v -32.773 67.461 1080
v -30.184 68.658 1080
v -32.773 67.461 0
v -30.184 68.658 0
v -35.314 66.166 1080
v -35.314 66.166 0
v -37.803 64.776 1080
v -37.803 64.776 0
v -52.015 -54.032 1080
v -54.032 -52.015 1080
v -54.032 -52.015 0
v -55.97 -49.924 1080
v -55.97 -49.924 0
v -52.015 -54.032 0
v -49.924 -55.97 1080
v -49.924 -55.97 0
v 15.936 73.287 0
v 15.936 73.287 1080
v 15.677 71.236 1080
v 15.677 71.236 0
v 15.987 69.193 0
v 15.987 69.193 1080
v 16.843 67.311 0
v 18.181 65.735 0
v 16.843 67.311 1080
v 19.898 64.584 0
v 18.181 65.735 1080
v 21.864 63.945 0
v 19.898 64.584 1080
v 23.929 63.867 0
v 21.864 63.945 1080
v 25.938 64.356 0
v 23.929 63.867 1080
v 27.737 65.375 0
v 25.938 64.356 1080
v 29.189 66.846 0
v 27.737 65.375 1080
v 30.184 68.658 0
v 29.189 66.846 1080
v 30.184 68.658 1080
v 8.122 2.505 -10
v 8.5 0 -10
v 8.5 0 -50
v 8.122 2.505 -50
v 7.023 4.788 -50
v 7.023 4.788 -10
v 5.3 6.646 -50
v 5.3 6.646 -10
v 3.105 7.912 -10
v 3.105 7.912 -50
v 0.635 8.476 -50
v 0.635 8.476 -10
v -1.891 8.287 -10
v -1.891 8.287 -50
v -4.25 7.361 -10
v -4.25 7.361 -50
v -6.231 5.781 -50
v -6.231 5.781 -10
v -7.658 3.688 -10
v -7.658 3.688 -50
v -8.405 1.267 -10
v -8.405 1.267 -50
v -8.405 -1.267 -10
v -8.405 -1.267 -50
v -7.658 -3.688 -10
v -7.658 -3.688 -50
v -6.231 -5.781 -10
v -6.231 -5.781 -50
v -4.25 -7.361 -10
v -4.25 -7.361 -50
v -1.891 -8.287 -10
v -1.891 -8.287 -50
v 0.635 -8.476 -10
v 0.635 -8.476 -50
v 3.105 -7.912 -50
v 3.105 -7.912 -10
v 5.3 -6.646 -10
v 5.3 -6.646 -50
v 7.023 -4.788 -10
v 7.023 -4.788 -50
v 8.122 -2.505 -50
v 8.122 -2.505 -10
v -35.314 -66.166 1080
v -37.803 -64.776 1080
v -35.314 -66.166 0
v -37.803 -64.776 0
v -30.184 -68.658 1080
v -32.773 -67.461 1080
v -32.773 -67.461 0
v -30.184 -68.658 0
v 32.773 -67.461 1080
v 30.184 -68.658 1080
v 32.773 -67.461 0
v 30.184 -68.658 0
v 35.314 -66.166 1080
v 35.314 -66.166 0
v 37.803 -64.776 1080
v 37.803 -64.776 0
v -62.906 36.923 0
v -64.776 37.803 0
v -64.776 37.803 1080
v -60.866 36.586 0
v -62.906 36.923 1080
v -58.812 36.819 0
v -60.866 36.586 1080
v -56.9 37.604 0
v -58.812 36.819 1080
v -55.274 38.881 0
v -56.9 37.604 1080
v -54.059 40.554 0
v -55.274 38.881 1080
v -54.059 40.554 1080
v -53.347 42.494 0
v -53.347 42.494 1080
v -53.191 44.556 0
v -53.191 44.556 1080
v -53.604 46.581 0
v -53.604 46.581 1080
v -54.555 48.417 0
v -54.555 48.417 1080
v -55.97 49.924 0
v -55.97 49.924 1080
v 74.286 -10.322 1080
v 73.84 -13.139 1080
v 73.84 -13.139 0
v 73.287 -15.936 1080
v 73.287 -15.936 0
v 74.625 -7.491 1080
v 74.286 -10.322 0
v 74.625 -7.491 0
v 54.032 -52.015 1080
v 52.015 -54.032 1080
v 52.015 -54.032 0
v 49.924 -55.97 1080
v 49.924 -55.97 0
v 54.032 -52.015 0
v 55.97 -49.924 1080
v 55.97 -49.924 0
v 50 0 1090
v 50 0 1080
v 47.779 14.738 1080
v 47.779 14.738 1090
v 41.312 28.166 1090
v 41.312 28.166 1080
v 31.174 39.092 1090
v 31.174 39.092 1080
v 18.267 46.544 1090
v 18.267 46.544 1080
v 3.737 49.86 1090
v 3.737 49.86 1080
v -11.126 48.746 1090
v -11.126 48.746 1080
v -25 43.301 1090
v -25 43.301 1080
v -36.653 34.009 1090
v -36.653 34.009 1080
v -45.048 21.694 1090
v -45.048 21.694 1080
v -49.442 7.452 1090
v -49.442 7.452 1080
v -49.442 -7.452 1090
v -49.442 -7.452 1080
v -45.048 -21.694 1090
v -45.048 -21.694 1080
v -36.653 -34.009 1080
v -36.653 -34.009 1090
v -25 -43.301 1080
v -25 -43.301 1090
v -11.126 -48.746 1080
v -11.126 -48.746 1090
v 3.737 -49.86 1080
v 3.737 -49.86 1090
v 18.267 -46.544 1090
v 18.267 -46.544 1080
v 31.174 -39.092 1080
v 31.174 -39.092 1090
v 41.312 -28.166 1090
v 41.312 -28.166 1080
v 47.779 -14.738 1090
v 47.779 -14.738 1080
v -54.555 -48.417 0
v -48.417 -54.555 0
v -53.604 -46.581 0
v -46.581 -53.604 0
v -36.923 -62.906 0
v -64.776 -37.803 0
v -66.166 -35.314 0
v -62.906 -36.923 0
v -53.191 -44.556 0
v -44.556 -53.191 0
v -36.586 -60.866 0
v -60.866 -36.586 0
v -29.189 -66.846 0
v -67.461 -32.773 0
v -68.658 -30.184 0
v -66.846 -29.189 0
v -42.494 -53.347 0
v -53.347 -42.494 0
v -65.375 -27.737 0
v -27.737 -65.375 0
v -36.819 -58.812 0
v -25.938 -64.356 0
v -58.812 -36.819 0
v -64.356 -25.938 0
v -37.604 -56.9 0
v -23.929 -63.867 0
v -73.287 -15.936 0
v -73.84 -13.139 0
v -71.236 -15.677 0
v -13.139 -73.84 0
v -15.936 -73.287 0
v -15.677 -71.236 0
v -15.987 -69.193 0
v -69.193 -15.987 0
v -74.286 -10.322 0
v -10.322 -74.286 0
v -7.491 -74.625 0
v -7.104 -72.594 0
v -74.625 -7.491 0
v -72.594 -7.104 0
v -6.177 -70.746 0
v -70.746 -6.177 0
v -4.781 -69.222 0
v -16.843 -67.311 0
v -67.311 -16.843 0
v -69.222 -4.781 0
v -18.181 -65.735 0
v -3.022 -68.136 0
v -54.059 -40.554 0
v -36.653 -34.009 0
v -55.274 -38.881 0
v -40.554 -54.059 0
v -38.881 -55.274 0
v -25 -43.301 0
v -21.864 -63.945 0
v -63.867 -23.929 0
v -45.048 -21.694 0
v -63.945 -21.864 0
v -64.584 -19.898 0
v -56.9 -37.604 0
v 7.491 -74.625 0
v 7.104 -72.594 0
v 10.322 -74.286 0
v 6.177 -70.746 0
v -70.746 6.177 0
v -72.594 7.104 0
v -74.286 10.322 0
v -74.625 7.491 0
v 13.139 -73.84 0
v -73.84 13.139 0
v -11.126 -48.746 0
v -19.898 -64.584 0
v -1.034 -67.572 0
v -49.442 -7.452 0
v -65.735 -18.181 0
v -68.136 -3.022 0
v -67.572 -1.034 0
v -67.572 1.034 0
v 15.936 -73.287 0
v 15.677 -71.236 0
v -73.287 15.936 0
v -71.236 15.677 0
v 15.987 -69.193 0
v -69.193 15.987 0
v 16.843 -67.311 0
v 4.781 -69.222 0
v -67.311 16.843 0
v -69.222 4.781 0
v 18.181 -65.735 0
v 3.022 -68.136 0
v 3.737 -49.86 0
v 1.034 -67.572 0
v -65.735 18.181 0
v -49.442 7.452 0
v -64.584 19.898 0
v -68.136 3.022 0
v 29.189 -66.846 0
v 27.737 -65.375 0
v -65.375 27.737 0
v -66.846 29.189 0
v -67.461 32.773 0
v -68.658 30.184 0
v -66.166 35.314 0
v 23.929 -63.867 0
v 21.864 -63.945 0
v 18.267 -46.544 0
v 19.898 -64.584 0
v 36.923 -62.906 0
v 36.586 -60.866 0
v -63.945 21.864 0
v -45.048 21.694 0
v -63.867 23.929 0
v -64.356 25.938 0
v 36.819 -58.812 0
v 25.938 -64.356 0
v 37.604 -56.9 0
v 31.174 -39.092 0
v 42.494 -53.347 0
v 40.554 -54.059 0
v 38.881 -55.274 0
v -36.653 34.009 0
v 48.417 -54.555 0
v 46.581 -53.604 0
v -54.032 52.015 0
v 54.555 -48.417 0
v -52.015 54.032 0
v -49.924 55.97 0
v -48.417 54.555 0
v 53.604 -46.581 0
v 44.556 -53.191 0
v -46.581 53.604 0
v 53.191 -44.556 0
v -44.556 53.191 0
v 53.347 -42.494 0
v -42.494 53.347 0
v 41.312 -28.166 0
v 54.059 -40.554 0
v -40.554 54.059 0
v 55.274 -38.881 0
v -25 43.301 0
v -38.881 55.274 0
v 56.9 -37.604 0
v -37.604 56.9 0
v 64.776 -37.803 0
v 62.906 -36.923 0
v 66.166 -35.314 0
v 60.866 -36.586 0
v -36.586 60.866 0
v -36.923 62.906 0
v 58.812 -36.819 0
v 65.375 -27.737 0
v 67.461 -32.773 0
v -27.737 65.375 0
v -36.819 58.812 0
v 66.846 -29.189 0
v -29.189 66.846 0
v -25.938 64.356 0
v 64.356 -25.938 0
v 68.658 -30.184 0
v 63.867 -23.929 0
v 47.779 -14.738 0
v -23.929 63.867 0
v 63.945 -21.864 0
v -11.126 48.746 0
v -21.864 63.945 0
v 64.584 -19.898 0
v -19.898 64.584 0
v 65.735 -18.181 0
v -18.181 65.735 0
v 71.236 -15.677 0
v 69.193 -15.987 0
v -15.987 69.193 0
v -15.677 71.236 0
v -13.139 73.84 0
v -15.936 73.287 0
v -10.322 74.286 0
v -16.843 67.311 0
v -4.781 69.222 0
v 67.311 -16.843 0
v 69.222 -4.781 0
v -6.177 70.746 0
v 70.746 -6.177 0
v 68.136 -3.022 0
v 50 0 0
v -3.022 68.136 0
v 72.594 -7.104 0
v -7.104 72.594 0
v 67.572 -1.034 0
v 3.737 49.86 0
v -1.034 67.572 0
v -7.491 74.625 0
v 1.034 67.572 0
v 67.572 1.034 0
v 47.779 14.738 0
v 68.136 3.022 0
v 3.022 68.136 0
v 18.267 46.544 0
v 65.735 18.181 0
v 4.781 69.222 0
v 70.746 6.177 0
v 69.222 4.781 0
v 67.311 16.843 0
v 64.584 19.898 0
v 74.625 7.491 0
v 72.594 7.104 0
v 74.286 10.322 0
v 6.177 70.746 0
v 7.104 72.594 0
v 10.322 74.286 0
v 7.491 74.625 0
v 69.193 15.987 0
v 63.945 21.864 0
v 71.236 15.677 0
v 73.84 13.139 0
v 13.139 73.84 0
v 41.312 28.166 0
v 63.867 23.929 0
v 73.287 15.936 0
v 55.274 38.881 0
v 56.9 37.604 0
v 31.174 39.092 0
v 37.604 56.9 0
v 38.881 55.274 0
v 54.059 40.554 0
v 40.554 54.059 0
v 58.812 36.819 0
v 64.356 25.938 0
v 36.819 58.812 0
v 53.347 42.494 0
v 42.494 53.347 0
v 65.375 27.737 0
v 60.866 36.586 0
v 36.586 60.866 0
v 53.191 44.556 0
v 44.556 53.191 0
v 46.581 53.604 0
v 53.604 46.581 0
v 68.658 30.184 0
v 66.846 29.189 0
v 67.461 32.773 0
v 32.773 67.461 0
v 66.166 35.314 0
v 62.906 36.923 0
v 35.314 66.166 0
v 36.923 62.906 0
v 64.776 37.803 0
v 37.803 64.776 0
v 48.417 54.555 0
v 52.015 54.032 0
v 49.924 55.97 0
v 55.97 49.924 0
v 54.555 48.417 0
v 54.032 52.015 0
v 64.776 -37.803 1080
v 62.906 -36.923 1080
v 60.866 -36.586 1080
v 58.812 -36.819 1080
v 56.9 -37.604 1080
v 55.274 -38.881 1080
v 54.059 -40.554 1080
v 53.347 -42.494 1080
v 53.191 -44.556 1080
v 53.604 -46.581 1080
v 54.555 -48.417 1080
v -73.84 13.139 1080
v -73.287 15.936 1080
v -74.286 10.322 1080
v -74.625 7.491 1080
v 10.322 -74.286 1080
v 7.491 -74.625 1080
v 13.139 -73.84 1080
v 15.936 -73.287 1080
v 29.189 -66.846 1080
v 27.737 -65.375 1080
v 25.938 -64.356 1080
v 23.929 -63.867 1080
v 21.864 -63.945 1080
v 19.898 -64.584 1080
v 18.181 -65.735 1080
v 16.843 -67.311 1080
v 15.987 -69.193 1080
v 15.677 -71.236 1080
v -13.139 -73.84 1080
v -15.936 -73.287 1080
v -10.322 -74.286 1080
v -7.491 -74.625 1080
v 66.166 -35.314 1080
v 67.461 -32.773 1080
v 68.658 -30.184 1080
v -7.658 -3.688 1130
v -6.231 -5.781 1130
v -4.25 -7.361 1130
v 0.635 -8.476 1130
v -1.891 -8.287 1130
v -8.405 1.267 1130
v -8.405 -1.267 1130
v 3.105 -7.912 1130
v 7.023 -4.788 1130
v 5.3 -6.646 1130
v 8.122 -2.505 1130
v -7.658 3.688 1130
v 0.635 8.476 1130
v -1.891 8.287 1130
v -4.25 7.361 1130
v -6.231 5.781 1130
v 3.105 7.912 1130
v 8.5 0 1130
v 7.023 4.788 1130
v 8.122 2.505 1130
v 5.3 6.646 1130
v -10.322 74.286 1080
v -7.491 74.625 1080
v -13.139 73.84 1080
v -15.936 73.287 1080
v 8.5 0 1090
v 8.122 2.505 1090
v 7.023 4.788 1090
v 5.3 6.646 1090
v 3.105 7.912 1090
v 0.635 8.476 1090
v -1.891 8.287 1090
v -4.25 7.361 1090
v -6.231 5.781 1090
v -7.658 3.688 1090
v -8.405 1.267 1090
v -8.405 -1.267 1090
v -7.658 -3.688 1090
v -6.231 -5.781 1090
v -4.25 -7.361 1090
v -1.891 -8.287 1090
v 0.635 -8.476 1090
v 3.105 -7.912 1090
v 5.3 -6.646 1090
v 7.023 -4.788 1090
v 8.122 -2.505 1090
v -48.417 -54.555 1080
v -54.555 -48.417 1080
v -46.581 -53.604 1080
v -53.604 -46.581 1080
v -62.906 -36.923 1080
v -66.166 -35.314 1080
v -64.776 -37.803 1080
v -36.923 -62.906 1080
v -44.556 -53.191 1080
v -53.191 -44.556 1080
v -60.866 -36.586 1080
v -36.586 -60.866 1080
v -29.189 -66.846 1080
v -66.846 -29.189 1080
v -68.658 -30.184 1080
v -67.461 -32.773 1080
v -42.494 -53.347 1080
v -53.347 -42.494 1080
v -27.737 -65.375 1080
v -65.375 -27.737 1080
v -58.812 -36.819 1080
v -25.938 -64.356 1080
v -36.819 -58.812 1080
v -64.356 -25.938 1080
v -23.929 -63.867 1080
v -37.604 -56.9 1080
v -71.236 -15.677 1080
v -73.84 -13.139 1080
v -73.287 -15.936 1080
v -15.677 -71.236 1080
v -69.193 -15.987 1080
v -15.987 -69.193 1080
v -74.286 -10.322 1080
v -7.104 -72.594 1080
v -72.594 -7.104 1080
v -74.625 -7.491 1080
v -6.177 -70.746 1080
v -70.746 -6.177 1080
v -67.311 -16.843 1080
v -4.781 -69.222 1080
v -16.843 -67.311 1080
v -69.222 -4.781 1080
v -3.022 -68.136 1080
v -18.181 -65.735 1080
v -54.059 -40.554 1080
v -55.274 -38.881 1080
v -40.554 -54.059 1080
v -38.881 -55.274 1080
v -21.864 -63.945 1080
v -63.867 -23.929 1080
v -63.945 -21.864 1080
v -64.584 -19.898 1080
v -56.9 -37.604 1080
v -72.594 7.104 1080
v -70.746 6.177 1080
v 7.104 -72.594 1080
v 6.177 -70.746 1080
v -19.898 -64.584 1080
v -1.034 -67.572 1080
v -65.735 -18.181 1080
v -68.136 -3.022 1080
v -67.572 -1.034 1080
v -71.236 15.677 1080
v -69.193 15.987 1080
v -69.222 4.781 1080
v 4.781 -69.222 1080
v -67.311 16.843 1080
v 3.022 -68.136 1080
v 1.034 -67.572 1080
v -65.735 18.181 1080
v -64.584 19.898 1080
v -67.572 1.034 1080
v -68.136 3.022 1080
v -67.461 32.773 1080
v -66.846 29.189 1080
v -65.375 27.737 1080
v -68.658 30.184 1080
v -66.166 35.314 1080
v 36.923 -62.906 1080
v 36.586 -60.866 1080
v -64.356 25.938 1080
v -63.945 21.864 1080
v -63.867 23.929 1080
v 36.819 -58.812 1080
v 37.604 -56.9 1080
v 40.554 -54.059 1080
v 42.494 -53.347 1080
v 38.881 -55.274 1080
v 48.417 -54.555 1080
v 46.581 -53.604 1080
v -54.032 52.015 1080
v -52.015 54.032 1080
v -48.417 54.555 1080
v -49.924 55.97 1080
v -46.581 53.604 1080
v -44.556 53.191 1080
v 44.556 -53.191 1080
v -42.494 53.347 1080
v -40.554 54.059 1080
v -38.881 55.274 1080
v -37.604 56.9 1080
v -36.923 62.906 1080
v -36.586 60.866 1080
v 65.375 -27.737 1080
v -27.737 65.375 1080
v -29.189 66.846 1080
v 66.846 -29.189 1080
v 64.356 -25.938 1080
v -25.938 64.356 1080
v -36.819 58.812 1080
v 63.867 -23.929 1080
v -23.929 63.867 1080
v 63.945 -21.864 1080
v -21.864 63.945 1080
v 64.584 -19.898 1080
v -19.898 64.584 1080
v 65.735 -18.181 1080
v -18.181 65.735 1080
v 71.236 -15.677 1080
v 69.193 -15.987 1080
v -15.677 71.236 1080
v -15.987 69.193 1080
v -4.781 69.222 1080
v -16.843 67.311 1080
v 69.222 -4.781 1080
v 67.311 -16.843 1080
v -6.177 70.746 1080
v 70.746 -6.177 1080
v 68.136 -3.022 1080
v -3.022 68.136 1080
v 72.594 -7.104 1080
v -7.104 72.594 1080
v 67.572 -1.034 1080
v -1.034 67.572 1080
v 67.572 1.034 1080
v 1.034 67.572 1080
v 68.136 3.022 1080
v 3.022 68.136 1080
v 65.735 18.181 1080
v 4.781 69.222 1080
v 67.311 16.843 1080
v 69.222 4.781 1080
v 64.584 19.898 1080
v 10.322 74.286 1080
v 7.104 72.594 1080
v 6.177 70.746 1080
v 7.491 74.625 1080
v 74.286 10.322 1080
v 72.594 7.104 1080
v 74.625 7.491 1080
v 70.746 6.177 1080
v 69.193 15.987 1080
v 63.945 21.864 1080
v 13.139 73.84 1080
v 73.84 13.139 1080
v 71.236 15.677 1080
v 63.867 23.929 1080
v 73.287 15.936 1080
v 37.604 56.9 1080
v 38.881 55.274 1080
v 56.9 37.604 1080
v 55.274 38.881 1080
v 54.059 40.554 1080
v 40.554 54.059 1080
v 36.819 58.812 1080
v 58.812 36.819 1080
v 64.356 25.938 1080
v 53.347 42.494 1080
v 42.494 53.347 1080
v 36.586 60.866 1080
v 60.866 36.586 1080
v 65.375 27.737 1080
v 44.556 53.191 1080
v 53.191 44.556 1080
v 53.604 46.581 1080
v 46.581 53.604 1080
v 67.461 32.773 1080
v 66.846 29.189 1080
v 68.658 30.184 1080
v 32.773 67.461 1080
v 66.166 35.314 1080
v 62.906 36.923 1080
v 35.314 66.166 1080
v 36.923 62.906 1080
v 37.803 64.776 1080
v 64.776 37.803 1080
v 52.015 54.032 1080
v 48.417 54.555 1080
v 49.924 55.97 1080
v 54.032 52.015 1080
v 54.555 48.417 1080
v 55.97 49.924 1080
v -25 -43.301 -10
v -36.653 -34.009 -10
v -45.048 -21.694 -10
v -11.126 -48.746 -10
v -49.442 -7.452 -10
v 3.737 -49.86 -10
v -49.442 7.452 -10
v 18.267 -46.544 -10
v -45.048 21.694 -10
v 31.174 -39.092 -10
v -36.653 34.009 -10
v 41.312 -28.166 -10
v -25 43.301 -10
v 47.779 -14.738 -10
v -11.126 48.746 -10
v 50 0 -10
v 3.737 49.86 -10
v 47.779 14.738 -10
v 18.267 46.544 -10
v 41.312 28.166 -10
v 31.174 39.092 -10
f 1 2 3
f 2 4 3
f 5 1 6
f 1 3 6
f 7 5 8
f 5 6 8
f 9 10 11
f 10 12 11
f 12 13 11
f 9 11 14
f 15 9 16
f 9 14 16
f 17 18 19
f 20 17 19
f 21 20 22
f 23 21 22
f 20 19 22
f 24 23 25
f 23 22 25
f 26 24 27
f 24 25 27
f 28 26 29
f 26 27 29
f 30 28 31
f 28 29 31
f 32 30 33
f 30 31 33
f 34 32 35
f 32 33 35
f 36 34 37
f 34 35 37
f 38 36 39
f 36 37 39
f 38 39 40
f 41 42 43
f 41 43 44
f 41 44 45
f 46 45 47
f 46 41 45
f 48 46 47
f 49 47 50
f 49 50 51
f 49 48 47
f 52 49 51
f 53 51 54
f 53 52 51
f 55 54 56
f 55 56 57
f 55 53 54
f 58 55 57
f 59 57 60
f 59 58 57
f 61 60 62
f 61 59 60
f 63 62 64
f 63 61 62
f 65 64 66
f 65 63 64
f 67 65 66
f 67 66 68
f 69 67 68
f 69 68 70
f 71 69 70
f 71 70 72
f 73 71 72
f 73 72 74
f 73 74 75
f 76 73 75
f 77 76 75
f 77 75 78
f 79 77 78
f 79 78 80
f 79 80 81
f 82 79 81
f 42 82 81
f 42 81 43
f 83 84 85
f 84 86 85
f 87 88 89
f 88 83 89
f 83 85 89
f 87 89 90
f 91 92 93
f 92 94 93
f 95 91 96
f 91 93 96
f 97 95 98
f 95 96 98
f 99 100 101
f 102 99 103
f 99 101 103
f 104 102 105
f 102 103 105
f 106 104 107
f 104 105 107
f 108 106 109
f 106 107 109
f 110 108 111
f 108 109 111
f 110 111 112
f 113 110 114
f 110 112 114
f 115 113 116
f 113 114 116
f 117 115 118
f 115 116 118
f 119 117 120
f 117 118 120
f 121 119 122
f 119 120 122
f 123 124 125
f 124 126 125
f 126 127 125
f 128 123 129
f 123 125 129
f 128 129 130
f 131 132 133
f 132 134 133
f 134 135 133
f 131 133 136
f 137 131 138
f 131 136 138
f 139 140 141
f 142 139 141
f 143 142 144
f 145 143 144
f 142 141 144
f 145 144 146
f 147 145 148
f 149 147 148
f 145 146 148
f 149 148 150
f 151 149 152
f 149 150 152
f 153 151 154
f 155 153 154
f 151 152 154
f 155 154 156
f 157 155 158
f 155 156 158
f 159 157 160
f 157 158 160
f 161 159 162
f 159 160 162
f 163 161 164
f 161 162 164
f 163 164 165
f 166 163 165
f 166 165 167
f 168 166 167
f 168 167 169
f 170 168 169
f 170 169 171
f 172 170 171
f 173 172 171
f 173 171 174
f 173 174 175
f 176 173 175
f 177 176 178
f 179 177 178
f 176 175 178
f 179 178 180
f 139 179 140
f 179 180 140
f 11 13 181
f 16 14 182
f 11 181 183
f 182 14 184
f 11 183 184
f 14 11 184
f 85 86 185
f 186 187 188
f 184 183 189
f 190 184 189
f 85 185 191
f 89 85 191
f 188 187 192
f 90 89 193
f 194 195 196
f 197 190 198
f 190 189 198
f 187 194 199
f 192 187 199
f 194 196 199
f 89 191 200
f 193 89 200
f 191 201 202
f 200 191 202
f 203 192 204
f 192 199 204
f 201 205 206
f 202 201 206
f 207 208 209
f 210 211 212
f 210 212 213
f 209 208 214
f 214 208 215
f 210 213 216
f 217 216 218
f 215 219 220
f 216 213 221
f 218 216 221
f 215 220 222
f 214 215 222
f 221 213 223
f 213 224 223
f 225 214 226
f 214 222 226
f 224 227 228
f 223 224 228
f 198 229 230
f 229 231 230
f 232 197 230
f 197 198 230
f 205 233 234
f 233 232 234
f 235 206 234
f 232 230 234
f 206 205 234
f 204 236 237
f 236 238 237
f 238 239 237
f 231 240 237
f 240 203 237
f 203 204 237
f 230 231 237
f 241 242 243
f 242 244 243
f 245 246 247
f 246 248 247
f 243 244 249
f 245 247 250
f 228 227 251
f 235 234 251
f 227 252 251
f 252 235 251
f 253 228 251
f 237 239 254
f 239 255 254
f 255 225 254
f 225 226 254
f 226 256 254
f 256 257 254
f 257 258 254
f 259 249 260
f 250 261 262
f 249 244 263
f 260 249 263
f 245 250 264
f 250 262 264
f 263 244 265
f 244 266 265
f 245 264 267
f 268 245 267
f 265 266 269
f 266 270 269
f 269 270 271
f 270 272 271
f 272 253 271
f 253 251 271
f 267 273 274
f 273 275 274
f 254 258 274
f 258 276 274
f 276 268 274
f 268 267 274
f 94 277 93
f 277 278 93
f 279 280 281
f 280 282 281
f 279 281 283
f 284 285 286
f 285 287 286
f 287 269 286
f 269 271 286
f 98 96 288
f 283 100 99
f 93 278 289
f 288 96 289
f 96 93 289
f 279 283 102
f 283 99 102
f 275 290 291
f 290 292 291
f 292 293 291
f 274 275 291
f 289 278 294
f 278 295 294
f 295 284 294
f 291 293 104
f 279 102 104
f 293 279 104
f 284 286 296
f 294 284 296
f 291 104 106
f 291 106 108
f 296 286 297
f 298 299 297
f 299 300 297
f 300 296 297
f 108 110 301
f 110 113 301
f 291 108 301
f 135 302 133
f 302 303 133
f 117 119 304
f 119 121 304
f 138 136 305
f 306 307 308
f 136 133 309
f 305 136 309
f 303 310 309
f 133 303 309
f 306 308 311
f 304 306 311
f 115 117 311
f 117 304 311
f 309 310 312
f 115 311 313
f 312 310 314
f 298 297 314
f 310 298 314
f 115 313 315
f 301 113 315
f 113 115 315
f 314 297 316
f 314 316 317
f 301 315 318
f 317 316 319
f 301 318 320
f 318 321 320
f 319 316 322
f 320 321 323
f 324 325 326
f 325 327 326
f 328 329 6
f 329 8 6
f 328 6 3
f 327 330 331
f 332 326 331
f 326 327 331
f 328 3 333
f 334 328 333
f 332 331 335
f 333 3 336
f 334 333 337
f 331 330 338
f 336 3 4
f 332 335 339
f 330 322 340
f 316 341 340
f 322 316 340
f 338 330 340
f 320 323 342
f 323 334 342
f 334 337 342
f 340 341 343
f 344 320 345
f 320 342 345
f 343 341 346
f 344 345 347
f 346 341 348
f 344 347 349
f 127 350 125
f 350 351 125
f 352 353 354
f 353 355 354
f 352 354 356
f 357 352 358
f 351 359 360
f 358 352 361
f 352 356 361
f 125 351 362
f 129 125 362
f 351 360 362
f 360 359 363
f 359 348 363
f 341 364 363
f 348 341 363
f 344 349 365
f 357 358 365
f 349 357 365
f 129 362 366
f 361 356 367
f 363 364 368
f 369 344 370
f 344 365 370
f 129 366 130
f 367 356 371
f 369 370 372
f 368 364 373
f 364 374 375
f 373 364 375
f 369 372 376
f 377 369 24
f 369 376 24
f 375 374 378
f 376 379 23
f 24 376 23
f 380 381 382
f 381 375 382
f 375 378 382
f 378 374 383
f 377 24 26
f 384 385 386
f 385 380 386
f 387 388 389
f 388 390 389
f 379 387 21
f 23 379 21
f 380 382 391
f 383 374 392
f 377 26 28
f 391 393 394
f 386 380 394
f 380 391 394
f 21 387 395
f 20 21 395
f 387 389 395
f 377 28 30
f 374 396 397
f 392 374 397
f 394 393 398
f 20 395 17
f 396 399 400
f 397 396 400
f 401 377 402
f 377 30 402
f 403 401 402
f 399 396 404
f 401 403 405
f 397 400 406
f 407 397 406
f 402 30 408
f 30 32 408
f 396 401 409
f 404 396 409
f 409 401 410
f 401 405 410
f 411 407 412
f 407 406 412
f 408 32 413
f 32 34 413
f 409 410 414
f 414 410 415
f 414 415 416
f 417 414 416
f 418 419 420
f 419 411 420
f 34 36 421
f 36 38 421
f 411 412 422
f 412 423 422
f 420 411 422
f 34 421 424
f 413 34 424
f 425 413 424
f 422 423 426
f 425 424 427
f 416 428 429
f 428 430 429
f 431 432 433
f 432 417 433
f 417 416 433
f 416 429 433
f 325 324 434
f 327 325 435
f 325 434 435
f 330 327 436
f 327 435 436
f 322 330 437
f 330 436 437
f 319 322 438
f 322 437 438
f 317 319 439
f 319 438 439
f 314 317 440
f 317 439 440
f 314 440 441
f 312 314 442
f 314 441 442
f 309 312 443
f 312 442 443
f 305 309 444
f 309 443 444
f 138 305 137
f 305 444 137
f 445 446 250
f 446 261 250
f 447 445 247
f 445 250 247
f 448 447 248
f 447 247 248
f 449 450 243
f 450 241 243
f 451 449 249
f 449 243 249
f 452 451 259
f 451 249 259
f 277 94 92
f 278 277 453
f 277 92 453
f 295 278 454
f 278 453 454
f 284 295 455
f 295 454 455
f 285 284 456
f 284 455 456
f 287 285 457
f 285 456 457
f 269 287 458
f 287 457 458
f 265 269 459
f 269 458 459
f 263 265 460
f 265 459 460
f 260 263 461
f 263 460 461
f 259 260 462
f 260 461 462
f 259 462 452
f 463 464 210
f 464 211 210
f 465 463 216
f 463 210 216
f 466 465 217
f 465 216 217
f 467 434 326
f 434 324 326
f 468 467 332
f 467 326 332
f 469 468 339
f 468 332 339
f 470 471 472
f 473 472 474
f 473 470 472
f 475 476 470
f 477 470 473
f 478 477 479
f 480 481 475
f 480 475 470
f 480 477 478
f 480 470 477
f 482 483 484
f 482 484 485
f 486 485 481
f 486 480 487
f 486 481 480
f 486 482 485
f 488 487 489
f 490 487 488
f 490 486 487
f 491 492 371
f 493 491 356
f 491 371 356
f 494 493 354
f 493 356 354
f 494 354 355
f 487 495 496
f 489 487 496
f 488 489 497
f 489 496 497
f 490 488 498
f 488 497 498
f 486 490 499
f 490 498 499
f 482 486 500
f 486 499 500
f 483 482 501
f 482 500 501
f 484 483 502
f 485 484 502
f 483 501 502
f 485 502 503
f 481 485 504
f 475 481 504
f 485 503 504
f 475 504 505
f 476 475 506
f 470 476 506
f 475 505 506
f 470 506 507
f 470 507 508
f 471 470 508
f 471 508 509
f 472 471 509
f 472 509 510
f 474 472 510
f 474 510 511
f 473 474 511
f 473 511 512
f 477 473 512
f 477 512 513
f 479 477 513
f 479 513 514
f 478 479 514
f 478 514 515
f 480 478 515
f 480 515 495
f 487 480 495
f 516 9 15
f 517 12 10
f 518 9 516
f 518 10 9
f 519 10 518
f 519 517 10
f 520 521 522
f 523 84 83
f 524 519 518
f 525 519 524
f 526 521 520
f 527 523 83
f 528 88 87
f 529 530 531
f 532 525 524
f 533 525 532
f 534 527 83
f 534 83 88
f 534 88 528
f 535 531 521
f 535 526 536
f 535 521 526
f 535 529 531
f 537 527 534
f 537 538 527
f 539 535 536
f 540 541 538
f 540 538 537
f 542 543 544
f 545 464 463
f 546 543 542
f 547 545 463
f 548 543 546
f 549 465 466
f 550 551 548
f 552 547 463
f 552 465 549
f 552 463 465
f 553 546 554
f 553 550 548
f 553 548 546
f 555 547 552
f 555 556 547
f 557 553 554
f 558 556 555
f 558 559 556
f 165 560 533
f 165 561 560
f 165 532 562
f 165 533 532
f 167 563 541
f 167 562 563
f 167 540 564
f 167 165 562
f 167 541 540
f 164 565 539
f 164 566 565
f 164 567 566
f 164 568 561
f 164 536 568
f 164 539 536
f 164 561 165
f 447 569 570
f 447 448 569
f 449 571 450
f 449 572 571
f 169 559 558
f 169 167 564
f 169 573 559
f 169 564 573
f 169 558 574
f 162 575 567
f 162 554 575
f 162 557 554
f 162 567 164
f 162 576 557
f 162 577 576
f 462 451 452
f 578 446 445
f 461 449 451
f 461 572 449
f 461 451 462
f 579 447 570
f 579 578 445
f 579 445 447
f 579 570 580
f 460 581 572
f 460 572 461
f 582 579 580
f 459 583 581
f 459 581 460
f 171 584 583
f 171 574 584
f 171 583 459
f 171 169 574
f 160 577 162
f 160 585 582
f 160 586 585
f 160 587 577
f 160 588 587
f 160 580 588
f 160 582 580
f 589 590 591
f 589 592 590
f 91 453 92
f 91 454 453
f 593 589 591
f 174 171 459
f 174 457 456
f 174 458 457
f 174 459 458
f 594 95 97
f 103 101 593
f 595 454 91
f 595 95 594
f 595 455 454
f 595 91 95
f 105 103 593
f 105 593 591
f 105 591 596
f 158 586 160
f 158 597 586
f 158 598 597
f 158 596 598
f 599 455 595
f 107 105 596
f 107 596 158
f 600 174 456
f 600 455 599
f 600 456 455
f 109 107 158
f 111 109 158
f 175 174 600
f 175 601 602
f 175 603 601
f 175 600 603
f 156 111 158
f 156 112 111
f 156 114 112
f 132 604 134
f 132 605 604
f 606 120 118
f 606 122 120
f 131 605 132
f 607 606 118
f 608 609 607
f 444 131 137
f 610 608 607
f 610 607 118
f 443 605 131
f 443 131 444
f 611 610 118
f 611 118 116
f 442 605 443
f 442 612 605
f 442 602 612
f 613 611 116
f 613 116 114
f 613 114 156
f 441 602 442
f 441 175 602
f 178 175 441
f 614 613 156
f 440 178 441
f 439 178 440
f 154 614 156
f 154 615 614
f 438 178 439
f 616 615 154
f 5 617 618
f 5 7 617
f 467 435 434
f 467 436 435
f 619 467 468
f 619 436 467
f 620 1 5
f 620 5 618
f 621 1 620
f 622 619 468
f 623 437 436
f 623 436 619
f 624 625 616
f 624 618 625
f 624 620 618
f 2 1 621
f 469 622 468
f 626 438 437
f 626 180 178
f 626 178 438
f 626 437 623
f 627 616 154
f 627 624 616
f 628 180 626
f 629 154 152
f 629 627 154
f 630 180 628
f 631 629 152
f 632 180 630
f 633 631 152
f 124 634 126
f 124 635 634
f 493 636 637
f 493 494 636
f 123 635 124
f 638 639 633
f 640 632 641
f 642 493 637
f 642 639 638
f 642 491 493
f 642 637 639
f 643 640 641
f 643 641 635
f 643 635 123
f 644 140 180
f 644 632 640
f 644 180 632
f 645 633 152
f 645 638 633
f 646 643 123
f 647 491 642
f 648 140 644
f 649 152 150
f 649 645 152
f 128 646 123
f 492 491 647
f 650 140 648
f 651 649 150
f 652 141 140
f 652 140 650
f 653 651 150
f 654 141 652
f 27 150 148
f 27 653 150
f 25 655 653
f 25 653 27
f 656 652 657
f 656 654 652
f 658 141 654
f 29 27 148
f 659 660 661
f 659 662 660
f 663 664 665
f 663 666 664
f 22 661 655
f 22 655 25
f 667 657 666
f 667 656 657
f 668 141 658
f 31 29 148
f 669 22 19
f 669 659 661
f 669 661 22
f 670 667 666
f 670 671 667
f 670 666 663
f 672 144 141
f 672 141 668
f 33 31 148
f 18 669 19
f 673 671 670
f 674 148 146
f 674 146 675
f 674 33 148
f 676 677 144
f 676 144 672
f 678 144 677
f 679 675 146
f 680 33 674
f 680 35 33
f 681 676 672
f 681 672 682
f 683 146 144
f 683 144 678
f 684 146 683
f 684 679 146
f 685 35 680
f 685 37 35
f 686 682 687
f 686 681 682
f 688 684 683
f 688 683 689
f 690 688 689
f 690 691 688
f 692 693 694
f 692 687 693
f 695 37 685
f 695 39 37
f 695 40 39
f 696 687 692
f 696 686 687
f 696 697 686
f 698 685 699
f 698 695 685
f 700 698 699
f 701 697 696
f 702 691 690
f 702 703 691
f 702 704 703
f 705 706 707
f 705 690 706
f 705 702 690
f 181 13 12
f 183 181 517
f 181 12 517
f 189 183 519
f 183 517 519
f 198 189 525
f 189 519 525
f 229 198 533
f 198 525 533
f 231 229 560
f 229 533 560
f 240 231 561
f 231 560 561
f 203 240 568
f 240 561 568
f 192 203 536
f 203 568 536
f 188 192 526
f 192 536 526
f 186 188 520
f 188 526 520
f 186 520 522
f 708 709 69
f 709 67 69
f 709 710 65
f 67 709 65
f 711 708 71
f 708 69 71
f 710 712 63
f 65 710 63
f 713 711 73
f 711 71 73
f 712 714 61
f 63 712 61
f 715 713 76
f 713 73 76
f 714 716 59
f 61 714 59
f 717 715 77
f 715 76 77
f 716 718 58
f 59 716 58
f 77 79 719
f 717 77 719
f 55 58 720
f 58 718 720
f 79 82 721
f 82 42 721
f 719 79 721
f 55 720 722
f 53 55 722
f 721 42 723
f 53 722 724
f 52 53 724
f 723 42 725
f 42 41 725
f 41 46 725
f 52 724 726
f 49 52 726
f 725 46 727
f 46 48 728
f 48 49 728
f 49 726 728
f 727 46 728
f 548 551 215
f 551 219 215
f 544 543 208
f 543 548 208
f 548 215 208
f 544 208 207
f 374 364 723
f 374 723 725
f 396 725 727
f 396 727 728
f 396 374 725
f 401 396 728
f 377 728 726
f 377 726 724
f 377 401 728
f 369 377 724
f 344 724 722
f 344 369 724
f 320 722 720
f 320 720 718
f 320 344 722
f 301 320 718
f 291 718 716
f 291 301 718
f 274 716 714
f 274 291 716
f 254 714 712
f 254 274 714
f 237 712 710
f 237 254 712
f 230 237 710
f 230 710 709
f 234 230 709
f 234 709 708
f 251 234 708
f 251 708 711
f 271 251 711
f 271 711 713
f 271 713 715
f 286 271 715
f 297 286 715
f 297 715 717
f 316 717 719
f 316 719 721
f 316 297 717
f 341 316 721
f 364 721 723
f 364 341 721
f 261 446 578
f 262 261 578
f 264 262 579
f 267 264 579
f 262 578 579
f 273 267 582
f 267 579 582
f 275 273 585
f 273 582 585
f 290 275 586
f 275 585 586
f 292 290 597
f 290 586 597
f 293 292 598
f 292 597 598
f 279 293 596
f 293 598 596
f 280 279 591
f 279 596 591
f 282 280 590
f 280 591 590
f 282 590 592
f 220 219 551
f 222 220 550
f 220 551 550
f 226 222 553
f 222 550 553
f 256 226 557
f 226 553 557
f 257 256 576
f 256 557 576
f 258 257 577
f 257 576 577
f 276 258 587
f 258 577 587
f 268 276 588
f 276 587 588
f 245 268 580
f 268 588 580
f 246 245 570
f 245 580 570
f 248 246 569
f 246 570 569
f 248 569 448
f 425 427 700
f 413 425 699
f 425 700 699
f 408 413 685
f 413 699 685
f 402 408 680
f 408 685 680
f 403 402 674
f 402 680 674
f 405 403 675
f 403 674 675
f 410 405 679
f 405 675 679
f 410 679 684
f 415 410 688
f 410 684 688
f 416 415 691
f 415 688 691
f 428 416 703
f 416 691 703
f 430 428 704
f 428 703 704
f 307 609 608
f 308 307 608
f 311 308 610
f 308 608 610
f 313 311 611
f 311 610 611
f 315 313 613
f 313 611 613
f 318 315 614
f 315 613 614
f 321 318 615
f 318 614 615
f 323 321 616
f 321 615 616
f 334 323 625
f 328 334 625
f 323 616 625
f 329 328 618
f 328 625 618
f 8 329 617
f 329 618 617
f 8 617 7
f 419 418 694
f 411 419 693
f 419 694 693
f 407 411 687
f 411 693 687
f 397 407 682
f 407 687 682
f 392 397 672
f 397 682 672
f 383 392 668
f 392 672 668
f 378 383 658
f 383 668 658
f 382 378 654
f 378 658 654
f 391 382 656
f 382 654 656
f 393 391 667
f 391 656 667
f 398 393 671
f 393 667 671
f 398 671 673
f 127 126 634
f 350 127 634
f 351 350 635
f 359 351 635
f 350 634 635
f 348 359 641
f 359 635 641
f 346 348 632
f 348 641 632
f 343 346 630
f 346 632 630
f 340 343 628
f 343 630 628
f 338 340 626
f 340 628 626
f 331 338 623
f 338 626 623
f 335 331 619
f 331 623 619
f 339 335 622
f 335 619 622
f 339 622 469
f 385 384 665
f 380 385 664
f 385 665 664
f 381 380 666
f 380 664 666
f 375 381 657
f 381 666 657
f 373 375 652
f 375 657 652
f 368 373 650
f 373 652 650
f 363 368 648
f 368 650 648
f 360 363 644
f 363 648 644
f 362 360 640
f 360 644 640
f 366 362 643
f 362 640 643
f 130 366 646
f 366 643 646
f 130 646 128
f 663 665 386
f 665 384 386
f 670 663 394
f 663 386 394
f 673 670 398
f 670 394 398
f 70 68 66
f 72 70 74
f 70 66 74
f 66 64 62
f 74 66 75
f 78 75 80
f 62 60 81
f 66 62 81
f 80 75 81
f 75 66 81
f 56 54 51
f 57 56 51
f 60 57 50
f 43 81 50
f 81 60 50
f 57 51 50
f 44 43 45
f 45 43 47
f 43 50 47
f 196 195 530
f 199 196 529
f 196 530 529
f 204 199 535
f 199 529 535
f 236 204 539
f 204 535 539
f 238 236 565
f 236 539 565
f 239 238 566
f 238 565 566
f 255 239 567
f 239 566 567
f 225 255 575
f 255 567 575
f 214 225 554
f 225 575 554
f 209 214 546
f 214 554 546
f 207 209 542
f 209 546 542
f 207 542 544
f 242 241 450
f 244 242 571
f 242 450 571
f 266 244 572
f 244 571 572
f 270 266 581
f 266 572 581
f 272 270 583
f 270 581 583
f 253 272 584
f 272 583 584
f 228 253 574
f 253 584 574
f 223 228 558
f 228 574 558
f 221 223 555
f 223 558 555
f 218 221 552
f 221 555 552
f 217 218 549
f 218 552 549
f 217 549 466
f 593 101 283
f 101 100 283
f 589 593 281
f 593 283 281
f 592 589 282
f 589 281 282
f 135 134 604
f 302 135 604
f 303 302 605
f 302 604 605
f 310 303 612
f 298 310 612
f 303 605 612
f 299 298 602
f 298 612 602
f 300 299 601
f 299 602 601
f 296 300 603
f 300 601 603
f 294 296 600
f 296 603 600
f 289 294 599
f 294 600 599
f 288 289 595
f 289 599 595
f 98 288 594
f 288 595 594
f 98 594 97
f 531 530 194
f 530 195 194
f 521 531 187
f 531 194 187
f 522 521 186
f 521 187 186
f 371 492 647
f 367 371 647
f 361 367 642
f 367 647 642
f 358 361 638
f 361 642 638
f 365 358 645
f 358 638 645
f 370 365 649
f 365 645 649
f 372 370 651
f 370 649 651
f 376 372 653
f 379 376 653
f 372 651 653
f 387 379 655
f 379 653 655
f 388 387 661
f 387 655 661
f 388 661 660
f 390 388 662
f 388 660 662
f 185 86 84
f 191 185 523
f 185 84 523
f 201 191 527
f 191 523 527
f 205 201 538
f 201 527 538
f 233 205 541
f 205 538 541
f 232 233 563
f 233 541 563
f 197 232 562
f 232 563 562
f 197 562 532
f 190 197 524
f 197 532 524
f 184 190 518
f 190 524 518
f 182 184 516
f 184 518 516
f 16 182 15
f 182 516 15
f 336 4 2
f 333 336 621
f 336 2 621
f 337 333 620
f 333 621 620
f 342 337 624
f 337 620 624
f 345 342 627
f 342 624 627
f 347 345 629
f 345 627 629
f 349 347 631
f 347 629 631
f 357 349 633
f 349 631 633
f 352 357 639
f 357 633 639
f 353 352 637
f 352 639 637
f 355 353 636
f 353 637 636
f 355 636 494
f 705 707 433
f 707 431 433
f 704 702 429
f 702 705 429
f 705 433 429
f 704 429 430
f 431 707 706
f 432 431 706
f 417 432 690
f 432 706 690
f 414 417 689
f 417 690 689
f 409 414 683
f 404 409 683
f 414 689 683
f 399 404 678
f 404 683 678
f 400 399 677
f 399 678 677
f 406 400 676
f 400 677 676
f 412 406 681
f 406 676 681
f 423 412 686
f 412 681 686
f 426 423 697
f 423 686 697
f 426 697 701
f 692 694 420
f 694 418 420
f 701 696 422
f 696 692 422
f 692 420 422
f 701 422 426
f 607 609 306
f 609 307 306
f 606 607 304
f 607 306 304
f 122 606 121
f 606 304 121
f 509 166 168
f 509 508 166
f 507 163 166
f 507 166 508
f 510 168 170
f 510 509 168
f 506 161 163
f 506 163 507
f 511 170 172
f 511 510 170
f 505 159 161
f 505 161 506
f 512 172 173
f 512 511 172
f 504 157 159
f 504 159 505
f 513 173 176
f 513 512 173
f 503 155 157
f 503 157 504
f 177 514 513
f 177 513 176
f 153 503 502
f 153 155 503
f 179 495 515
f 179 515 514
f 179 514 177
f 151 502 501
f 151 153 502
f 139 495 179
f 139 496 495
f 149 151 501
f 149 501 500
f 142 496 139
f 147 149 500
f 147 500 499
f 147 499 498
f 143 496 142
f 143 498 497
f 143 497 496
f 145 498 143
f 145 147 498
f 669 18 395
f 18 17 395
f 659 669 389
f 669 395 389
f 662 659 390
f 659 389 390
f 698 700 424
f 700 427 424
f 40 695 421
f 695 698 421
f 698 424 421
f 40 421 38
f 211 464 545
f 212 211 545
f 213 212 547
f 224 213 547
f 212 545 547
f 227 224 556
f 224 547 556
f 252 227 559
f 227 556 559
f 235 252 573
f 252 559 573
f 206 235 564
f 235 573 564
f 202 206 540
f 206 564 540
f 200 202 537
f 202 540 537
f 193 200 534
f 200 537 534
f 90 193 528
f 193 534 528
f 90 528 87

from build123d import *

# Parameters (mm, degrees)
IZIM1_R                     = 75
Y_KSEKLIK_EKSTR_ZYON1_DEPTH = 1080
IZIM2_R                     = 8.5
Y_KSEKLIK_EKSTR_ZYON2_DEPTH = 50
IZIM3_R                     = 50
Y_KSEKLIK_EKSTR_ZYON3_DEPTH = 10
IZIM4_R                     = 7.5
KES_EKSTR_ZYON1_DEPTH       = 1135.966959872
DAIRESEL_KAPLAMA1_COUNT     = 20


with BuildPart() as part:
    # Çizim1 → Yükseklik-Ekstrüzyon1 (new body)
    with BuildSketch(Plane.XY):
        Circle(IZIM1_R)
    extrude(amount=Y_KSEKLIK_EKSTR_ZYON1_DEPTH)

    # Çizim2 → Yükseklik-Ekstrüzyon2 (add)
    with BuildSketch(Plane.XY.offset(1080)):
        Circle(IZIM2_R)
    y_kseklik_ekstr_zyon2 = extrude(amount=Y_KSEKLIK_EKSTR_ZYON2_DEPTH)

    # Aynalama1: Yükseklik-Ekstrüzyon2 across plane
    add(y_kseklik_ekstr_zyon2.mirror(Plane.XY.offset(540)))

    # Çizim3 → Yükseklik-Ekstrüzyon3 (add)
    with BuildSketch(Plane.XY.offset(1080)):
        Circle(IZIM3_R)
    y_kseklik_ekstr_zyon3 = extrude(amount=Y_KSEKLIK_EKSTR_ZYON3_DEPTH)

    # Aynalama2: Yükseklik-Ekstrüzyon3 across plane
    add(y_kseklik_ekstr_zyon3.mirror(Plane.XY.offset(540)))

    # Çizim4 → Kes-Ekstrüzyon1 (cut, through all)
    with BuildSketch(Plane.XY.offset(1080)):
        with Locations((0, 75)):
            Circle(IZIM4_R)
    kes_ekstr_zyon1 = extrude(amount=-KES_EKSTR_ZYON1_DEPTH, mode=Mode.SUBTRACT)

    # Dairesel Kaplama1: Kes-Ekstrüzyon1 ×20 about axis
    dairesel_kaplama1_axis = Axis((0, 0, 1080), (0, 0, -1))
    for i in range(1, DAIRESEL_KAPLAMA1_COUNT):
        add(kes_ekstr_zyon1.rotate(dairesel_kaplama1_axis, i * 360 / DAIRESEL_KAPLAMA1_COUNT), mode=Mode.SUBTRACT)


solid = part.part
